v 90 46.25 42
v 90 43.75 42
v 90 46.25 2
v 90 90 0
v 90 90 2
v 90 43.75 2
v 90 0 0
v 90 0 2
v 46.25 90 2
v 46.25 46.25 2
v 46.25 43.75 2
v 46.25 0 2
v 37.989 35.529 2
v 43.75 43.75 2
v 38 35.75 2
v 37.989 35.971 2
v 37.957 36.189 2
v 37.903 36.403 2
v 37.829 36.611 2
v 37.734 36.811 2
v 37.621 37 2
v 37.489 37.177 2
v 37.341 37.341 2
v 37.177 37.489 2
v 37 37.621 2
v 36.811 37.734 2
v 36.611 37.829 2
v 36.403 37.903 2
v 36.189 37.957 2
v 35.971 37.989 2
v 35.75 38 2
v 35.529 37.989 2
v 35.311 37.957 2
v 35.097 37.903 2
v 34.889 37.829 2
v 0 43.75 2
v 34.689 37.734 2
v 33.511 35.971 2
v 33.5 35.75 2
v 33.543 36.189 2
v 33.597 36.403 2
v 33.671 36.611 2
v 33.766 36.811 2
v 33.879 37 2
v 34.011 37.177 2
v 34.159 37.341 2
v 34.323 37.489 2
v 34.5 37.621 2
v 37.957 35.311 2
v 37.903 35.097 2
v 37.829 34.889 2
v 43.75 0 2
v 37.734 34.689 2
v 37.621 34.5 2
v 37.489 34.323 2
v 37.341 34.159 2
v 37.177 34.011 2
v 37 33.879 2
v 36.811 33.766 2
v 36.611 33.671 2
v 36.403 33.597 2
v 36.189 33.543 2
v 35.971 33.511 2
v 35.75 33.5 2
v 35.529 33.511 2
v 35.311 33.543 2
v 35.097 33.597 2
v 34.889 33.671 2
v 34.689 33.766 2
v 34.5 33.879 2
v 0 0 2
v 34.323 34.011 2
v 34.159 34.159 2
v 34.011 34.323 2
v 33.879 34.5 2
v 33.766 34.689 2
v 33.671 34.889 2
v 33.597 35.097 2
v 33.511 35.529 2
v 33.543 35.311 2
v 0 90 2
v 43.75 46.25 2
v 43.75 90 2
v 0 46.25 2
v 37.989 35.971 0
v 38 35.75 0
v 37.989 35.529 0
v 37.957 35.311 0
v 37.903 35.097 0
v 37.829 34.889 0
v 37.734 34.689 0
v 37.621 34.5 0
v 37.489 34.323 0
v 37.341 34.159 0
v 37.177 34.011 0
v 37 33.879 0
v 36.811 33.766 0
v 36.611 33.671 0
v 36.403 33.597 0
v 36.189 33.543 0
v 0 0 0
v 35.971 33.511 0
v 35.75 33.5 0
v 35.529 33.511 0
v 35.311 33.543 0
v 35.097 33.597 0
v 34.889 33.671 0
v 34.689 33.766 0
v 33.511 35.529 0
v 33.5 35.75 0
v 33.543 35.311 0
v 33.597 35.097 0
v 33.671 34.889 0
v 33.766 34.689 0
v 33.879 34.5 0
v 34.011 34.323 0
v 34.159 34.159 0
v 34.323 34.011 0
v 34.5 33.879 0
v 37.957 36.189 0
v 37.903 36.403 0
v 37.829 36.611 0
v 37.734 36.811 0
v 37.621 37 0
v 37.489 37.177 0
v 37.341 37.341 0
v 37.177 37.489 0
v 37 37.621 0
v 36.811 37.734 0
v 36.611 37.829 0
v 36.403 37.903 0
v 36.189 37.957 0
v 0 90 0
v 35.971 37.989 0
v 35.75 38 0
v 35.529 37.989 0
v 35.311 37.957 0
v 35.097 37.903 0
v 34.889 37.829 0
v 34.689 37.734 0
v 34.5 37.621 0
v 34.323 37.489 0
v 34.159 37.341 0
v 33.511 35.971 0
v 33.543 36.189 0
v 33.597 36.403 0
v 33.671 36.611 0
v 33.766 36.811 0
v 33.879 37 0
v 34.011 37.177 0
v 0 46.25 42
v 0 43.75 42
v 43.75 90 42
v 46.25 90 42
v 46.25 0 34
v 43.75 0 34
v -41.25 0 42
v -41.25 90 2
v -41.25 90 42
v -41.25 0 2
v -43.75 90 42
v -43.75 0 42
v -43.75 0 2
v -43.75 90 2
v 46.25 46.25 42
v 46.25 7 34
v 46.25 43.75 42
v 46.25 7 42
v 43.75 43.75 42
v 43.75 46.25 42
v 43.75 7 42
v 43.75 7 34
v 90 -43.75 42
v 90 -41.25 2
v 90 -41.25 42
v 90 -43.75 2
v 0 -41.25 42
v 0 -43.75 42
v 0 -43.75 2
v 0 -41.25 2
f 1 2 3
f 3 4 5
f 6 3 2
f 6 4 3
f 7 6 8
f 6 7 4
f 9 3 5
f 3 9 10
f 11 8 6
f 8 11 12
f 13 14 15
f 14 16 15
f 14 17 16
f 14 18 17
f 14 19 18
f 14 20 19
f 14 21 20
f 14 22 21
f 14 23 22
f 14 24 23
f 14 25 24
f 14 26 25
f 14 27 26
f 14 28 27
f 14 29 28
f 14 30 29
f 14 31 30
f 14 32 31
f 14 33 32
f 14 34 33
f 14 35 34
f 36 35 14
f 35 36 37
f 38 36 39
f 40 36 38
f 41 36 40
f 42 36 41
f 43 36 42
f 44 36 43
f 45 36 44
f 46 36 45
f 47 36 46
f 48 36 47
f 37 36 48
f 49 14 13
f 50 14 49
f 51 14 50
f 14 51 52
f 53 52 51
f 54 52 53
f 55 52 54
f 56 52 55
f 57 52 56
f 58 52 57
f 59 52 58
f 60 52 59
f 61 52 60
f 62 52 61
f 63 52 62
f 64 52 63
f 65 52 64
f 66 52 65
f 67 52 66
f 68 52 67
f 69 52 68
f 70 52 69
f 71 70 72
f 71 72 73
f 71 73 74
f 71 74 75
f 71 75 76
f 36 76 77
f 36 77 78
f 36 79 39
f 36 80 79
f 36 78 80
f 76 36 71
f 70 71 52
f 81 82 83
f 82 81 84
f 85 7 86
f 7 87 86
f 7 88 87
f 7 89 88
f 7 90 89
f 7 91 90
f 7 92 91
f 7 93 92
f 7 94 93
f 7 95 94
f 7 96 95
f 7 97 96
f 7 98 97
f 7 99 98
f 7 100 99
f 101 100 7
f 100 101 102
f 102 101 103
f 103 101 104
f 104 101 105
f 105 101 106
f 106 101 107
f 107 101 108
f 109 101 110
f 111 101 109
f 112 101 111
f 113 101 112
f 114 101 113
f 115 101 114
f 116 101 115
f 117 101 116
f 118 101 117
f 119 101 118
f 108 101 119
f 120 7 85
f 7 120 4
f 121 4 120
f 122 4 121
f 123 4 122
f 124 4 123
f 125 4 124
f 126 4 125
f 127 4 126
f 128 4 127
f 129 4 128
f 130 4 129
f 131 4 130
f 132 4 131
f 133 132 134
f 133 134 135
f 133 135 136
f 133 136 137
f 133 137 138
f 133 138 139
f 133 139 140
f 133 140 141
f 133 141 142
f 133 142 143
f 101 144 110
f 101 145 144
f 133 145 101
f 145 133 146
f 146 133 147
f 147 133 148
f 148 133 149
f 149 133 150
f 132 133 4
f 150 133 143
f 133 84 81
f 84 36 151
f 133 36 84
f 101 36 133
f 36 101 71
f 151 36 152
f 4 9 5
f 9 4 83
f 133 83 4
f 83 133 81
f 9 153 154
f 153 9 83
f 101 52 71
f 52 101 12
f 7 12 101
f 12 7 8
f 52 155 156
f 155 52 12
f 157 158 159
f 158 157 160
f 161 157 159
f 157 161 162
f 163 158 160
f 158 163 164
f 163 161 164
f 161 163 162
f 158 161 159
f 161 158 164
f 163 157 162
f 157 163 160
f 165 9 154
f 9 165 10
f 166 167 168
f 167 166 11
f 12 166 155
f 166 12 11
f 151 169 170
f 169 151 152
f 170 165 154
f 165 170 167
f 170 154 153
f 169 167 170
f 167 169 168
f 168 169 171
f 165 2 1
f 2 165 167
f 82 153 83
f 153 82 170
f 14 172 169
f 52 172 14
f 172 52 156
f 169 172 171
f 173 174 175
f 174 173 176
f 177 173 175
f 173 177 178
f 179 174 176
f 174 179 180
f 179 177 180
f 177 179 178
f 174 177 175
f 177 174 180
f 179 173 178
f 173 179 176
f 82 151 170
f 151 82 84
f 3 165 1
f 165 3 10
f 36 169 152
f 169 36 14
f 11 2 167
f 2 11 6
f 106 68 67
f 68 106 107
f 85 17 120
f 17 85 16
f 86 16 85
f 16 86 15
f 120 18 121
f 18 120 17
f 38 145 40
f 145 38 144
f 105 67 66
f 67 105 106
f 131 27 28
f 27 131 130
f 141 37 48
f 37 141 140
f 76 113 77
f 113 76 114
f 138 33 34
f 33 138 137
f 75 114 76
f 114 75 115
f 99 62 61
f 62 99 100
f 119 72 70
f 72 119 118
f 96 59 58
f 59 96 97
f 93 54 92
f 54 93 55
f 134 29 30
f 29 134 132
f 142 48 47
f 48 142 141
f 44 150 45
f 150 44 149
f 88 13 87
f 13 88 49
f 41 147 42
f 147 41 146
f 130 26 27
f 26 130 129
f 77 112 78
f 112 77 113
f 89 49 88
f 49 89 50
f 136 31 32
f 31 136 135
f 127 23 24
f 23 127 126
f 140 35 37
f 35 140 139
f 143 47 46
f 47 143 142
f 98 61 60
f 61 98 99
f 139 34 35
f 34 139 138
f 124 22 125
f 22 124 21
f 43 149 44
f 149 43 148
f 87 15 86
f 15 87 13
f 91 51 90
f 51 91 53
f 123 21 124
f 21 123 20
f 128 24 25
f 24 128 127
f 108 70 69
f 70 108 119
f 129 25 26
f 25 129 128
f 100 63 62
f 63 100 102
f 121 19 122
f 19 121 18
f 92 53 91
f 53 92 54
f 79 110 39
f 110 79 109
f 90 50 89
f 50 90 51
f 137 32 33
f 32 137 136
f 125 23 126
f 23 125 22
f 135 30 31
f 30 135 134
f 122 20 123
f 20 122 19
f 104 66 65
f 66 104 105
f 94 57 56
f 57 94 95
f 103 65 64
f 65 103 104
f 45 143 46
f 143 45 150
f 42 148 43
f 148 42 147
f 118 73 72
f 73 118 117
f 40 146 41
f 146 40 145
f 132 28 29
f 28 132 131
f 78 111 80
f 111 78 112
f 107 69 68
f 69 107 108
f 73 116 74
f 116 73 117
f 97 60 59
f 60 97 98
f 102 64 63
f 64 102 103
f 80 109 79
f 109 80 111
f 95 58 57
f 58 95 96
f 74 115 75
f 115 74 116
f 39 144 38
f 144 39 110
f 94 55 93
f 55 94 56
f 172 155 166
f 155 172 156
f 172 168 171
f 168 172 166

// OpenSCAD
// --- Dimensions in Millimeters ---

// Overall housing dimensions
outer_x = 90;    // Outer width of the box (X)
outer_y = 90;    // Outer depth of the box (Y)
top_plate_thickness = 2; // Thickness of the top plate (Z from 0 to 2)
wall_height = 40; // Height of the walls above the top plate (Total height is 42mm, but wall rises to Z=40)
wall_thickness = 2.5; // Thickness of the four side walls

// Screw hole dimensions
screw_hole_diameter = 4.5; // Diameter for M4 screw holes
screw_pattern_size = 71.5; // Side length of the square pattern for mounting holes

// Cable notch dimensions (on one wall)
notch_width = 12;      // Width of the cable notch (span along Y axis)
notch_depth = 8;       // Depth of the cable notch from the open edge (Z=40 down to Z=32)

// Rendering settings
$fn = 64;

// --- Module Definitions ---

// Function to create a rectangular prism centered at origin
module box(x, y, z) {
    cube([x, y, z]);
}

// --- Main Assembly ---

difference() {
    // 1. The main outer shell structure (Union of top plate and walls)

    union() {
        // A. Top Plate (Lies on Z=0 plane, thickness = 2mm)
        translate([0, 0, 0]) {
            box(outer_x, outer_y, top_plate_thickness);
        }

        // B. Walls (Four vertical walls rising from the top plate)
        inner_x = outer_x - 2 * wall_thickness;
        inner_y = outer_y - 2 * wall_thickness;

        // Wall 1: Front (Parallel to Y-axis, centered in X)
        translate([-(outer_x/2) + wall_thickness/2, 0, top_plate_thickness]) {
            box(wall_thickness, outer_y, wall_height);
        }

        // Wall 2: Back (Parallel to Y-axis, centered in X)
        translate([(outer_x/2) - wall_thickness/2, 0, top_plate_thickness]) {
            box(wall_thickness, outer_y, wall_height);
        }

        // Wall 3: Left (Parallel to X-axis, centered in Y)
        translate([0, -(outer_y/2) + wall_thickness/2, top_plate_thickness]) {
            box(outer_x, wall_thickness, wall_height);
        }

        // Wall 4: Right (Parallel to X-axis, centered in Y)
        translate([0, (outer_y/2) - wall_thickness/2, top_plate_thickness]) {
            box(outer_x, wall_thickness, wall_height);
        }
    }

    // 2. Cutouts (Subtractions)

    // A. Screw Holes in the Top Plate (Z=0 to Z=2)
    for (i = [-1, 1]) { // X positions relative to center
        for (j = [-1, 1]) { // Y positions relative to center
            translate([
                (screw_pattern_size/2) * i,
                (screw_pattern_size/2) * j,
                -0.1 // Start slightly below Z=0 for clean cut
            ]) {
                cylinder(h = top_plate_thickness + 0.2, r = screw_hole_diameter / 2);
            }
        }
    }

    // B. Cable Notch in one wall (Right Wall: X > outer_x/2 - wall_thickness/2)
    right_wall_center_x = (outer_x / 2) - (wall_thickness / 2);

    translate([
        right_wall_center_x, // Position along X axis of the right wall
        0,                    // Centered in Y for simplicity, though it spans the full height/width of the wall section
        top_plate_thickness  // Start cutting from the top surface (Z=2) downwards
    ]) {
        // The notch is 12mm wide (span along Y axis), and reaches 8mm down from Z=40.
        notch_span_y = notch_width; // 12mm span in Y

        // We model a rectangular prism that cuts into the right wall:
        // It must cut through the entire height of the wall (Z=2 to Z=42, or slightly more)
        // The required depth is from Z=32 to Z=40. Since we start cutting at Z=2, we need a tall cutter.
        translate([0, -notch_span_y/2, 32]) { // Start cutting at Z=32 (8mm down from Z=40)
            // The cut must be wide enough to pass through the wall thickness and long enough in Y.
            box(wall_thickness + 1, notch_span_y + 1, wall_height + 1); // Cut through the entire height of the wall structure (Z=2 to Z=42)
        }
    }
}
